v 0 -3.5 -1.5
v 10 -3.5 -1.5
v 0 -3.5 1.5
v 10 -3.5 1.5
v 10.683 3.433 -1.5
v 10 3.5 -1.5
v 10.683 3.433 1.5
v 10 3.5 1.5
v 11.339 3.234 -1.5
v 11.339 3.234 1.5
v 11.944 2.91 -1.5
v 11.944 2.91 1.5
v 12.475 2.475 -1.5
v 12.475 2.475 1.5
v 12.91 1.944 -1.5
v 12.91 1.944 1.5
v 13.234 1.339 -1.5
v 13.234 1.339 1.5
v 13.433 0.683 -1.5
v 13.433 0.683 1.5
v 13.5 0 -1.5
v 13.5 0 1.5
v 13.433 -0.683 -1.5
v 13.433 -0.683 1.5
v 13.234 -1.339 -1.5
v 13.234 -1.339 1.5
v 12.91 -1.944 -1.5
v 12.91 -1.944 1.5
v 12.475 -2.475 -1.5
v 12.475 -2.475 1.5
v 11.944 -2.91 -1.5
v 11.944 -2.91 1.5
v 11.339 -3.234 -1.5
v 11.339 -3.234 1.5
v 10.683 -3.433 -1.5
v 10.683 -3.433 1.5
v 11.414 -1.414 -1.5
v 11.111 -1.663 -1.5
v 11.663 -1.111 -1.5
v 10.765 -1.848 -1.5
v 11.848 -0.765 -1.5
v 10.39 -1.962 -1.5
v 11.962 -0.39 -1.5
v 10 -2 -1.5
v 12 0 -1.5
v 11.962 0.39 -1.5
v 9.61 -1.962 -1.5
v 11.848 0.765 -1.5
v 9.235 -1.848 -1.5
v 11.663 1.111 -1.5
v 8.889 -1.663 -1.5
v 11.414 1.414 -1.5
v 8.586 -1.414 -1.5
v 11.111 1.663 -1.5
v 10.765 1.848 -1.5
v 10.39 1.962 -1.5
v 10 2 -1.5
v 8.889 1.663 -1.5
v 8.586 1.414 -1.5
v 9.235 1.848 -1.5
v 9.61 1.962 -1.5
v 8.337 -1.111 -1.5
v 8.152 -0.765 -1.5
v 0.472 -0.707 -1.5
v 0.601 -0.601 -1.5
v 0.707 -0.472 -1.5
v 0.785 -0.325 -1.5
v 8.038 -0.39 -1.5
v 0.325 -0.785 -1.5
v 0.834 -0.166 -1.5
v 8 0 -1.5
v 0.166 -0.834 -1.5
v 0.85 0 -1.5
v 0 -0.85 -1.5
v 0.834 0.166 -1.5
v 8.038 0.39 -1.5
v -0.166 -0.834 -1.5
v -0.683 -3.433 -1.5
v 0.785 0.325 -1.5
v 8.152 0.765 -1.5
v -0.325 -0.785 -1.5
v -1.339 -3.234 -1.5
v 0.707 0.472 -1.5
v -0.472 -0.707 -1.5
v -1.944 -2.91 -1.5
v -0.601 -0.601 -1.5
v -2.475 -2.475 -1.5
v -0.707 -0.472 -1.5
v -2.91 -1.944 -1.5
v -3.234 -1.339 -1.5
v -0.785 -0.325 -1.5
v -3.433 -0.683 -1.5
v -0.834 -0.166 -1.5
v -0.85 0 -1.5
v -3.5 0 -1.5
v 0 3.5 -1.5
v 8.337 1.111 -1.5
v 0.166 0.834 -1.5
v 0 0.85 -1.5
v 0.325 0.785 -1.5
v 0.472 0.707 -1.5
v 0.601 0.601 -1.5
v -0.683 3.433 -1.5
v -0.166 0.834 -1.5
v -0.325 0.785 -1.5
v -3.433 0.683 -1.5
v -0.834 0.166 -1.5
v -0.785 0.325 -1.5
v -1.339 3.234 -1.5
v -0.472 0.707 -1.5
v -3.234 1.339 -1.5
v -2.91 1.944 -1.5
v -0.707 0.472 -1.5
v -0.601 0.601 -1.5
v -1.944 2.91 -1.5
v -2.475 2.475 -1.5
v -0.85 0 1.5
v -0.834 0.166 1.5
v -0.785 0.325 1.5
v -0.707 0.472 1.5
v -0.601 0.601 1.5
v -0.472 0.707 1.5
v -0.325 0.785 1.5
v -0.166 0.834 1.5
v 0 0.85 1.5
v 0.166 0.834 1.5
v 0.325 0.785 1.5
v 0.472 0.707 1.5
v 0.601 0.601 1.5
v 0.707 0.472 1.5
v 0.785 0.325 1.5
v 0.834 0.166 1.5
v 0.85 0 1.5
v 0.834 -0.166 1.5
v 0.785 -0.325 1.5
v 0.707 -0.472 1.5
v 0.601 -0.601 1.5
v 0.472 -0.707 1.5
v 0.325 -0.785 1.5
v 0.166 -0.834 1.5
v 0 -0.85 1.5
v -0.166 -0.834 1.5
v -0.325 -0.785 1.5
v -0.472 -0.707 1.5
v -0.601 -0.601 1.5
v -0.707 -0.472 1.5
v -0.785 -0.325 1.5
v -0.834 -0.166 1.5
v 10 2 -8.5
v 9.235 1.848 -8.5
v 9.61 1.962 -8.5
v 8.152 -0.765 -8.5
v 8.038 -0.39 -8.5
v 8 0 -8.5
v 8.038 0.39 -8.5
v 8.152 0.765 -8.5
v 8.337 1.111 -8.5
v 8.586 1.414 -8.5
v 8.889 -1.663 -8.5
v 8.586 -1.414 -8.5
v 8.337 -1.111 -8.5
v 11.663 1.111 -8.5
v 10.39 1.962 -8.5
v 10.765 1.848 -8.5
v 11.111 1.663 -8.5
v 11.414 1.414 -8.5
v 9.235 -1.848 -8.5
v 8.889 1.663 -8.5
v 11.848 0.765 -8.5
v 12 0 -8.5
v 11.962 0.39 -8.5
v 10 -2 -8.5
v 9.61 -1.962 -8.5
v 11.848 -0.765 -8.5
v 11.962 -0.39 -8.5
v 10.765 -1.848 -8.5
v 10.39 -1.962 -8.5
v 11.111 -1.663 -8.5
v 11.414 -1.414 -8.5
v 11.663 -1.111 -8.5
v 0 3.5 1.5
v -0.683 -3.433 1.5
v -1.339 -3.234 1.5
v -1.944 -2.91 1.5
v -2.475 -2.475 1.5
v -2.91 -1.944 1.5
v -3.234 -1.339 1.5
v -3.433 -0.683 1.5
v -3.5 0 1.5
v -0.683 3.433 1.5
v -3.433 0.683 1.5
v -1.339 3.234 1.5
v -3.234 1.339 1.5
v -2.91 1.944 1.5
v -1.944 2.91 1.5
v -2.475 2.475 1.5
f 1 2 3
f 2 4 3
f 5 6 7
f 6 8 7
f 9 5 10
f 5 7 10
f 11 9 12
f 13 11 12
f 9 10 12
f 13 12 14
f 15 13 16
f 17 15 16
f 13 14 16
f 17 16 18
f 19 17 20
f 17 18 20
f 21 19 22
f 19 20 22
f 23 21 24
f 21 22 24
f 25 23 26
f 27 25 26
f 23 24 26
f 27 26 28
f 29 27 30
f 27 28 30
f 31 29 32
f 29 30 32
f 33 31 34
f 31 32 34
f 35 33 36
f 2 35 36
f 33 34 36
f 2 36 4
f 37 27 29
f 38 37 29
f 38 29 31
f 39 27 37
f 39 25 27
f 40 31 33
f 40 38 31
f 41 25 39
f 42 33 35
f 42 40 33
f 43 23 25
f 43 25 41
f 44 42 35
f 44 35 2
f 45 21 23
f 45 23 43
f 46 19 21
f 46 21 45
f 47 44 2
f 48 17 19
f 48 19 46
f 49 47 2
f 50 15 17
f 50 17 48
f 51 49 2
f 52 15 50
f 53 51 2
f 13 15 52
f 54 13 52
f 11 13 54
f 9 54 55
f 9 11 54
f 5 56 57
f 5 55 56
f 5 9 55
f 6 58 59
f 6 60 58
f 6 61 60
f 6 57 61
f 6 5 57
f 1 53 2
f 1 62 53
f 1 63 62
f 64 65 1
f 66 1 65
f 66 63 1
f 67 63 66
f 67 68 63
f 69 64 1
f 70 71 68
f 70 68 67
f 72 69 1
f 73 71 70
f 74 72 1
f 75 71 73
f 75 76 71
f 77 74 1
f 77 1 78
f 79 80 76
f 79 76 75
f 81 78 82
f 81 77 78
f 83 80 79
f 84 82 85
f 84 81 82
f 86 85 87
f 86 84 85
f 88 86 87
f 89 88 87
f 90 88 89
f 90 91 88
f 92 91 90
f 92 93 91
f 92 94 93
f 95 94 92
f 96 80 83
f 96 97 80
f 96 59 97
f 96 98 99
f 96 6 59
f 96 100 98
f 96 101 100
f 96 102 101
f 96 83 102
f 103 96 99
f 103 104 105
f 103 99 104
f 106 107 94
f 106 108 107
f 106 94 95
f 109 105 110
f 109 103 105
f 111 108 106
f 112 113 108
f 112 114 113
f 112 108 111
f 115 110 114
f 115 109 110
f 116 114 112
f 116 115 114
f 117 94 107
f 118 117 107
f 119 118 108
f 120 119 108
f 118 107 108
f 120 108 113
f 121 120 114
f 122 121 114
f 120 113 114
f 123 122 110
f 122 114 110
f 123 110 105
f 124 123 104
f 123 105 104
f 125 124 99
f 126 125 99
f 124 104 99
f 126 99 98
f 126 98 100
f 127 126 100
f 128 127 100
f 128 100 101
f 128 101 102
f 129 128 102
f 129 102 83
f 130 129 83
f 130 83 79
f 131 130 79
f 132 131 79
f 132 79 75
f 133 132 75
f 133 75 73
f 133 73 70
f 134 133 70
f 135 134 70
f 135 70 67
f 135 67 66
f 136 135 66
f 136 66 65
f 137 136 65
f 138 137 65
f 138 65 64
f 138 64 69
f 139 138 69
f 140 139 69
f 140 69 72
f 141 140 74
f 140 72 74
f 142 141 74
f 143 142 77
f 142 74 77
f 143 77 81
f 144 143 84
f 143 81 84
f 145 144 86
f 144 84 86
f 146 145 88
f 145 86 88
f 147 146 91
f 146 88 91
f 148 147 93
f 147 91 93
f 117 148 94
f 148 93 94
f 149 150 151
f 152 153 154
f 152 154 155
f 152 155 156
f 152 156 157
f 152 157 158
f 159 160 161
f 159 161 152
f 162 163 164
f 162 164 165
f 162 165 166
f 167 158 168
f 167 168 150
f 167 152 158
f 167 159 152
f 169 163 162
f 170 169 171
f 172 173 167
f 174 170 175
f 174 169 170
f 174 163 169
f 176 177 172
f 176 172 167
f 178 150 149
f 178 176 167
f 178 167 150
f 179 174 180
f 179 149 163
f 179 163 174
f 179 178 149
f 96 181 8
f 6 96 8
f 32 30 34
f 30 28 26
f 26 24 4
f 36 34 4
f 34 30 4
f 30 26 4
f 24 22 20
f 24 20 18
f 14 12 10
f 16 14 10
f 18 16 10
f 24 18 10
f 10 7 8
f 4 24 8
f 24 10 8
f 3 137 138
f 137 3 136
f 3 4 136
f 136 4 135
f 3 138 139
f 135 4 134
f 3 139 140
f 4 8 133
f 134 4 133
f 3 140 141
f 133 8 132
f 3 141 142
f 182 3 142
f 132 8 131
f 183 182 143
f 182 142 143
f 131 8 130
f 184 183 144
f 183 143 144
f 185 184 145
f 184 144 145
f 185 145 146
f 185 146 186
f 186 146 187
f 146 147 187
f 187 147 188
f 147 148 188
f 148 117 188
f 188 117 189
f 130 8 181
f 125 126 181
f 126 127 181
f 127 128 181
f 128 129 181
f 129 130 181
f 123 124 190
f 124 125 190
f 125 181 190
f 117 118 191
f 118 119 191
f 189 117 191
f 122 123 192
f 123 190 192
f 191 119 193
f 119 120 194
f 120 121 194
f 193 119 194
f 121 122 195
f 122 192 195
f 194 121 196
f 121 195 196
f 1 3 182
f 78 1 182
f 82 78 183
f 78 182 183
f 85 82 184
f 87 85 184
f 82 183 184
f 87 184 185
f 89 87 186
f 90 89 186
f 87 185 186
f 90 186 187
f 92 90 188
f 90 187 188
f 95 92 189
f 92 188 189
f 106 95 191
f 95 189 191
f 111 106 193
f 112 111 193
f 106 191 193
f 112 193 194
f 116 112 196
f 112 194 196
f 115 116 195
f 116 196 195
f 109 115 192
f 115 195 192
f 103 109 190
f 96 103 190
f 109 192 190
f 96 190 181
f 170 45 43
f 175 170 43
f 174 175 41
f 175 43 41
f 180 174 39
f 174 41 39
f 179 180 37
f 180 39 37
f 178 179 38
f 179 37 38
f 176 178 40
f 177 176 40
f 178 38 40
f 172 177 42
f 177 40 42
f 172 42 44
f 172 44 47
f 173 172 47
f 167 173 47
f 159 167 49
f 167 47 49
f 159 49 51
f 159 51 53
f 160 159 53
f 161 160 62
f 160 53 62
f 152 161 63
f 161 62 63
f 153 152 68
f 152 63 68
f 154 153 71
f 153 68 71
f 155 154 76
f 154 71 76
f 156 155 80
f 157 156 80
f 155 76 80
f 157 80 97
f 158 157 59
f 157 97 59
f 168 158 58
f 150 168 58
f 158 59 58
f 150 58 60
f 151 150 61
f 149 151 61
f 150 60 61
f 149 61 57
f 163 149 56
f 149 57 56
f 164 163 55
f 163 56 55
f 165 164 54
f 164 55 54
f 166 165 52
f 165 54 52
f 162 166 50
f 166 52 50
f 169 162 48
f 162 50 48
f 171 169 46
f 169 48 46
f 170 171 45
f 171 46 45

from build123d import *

# Parameters (mm, degrees)
RESSALTO_EXTRUS_O1_DEPTH = 1.5
ESBO_O2_R                = 2
RESSALTO_EXTRUS_O2_DEPTH = 7
CORTE_EXTRUS_O1_REACH    = 17.604
ESBO_O3_R                = 0.85


with BuildPart() as part:
    # Esboço1 → Ressalto-extrusão1 (new, symmetric)
    with BuildSketch(Plane.XY):
        with BuildLine():
            Line((0, 3.5), (10, 3.5))
            ThreePointArc((10, 3.5), (13.5, 0), (10, -3.5))
            Line((10, -3.5), (0, -3.5))
            ThreePointArc((0, -3.5), (-3.5, 0), (0, 3.5))
        make_face()
    extrude(amount=RESSALTO_EXTRUS_O1_DEPTH, both=True)

    # Esboço2 → Ressalto-extrusão2 (add)
    with BuildSketch(Plane(origin=(0, 0, -1.5), x_dir=(-1, 0, 0), z_dir=(0, 0, -1))):
        with Locations(Location((-10, 0, 0), (0, 0, 180))):
            Circle(ESBO_O2_R)
    extrude(amount=RESSALTO_EXTRUS_O2_DEPTH)

    # Esboço3 → Corte-extrusão1 (cut, up to next)
    with BuildSketch(Plane(origin=(0, 0, -1.5), x_dir=(-1, 0, 0), z_dir=(0, 0, -1)), mode=Mode.PRIVATE) as corte_extrus_o1_sk1:
        Circle(ESBO_O3_R)
    corte_extrus_o1_tool1 = extrude(corte_extrus_o1_sk1.sketch, amount=-CORTE_EXTRUS_O1_REACH, mode=Mode.PRIVATE) & part.part
    add(corte_extrus_o1_tool1.solids().sort_by_distance((0, 0, -1.5))[0], mode=Mode.SUBTRACT)


solid = part.part
